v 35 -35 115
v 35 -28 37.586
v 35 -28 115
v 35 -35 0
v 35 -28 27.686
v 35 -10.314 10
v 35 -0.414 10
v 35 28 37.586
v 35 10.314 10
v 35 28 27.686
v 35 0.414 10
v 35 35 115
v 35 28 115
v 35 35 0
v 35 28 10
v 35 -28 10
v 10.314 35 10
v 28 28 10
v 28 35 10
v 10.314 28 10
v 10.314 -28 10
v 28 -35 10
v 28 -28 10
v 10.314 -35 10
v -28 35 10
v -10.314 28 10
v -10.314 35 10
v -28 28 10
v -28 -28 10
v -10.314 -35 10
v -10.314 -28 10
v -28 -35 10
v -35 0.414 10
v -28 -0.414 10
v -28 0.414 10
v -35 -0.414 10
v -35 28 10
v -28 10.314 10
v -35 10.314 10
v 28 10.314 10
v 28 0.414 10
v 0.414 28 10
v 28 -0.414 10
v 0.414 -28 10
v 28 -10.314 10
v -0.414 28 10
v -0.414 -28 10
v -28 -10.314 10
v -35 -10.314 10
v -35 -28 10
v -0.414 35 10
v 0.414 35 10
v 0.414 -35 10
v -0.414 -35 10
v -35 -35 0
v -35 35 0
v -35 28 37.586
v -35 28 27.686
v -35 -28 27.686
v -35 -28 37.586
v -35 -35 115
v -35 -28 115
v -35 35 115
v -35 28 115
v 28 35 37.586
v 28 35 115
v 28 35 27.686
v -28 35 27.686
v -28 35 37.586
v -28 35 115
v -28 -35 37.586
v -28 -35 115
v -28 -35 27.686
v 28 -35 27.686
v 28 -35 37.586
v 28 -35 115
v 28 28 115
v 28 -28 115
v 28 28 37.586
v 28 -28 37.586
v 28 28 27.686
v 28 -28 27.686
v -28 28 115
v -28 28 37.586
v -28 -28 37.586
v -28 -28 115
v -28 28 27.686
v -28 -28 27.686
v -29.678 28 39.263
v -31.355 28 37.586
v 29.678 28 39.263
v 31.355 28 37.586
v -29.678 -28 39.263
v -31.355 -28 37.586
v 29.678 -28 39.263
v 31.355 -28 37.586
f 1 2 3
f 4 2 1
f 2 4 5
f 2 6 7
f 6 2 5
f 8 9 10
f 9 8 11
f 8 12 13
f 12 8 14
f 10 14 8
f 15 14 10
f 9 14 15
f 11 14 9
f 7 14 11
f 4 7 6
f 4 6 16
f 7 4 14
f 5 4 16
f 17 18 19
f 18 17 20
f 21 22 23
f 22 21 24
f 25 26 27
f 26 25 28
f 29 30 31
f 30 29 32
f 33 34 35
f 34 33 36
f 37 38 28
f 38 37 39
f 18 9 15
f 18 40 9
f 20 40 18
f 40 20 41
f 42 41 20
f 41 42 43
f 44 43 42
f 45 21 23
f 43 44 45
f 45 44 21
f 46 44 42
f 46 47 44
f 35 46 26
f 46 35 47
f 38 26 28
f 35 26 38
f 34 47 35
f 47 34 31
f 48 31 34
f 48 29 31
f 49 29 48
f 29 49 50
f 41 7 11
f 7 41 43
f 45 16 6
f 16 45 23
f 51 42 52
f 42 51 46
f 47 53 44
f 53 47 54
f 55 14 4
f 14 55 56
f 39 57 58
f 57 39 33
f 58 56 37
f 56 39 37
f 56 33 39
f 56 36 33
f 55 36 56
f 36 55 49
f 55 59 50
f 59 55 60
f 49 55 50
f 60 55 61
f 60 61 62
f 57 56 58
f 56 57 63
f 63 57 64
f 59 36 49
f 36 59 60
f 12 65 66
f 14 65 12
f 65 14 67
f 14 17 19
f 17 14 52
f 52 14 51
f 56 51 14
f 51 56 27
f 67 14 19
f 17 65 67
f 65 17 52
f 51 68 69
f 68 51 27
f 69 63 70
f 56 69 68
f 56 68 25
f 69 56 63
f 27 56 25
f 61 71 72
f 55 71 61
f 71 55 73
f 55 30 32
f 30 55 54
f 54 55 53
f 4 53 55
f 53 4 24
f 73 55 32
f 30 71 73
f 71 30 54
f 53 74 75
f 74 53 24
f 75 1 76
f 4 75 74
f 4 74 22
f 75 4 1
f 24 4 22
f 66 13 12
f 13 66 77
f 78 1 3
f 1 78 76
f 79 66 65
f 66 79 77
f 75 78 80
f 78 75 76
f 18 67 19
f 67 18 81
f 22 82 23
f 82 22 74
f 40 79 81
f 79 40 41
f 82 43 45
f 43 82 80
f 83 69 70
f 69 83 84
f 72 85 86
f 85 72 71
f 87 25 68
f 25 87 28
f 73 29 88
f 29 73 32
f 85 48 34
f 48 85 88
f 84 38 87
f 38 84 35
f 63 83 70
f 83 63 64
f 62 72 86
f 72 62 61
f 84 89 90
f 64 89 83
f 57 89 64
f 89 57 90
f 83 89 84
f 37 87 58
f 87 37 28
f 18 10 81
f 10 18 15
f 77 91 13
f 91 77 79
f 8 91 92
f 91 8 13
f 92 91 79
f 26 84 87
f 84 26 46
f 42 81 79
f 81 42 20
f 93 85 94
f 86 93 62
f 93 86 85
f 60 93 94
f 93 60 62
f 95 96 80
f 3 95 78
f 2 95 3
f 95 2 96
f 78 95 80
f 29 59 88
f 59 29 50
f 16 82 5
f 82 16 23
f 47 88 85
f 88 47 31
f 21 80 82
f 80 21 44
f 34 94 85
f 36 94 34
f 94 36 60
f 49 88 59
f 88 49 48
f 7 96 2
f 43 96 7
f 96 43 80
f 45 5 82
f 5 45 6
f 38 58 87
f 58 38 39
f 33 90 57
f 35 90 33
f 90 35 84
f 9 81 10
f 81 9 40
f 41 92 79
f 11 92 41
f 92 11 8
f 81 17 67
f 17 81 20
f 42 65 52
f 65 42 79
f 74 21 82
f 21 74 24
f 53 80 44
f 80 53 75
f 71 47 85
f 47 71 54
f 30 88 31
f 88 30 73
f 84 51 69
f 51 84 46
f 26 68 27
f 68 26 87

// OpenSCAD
base_width = 70.0;
base_height = 10.0;

leg_height = 115.0;
leg_width = 7.0;
leg_placement = base_width / 2 - leg_width / 2;

support_length = sqrt(pow(base_width, 2) / 2.5);

// base shape
difference () {
    union () {
        // base
        translate([0, 0, base_height / 2]) {
            cube([base_width, base_width, base_height], true);
        }
        
        // legs
        translate([leg_placement, 0.0, leg_height / 2.0]) 
            { cube([leg_width, base_width, leg_height], true); };
        translate([-leg_placement, 0.0, leg_height / 2.0]) 
            { cube([leg_width, base_width, leg_height], true); };
    };

    translate([0, 0, (leg_height / 2) + base_height]) 
        { cube([base_width + leg_width + 1, base_width - 2 * leg_width, leg_height], true); };
};

// supports
translate([-leg_placement, -base_width / 4 + 1, support_length / 2 - 1]) {
    rotate(45, [1, 0, 0]) {
        cube([leg_width, leg_width, support_length], true);
    };
};
translate([leg_placement, -base_width / 4 + 1, support_length / 2 - 1]) {
    rotate(45, [1, 0, 0]) {
        cube([leg_width, leg_width, support_length], true);
    };
};

translate([-leg_placement, base_width / 4 - 1, support_length / 2 - 1]) {
    rotate(-45, [1, 0, 0]) {
        cube([leg_width, leg_width, support_length], true);
    };
};
translate([leg_placement, base_width / 4 - 1, support_length / 2 - 1]) {
    rotate(-45, [1, 0, 0]) {
        cube([leg_width, leg_width, support_length], true);
    };
};

translate([base_width / 4 - 1, leg_placement, support_length / 2 - 1]) {
    rotate(45, [0, 1, 0]) {
        cube([leg_width, leg_width, support_length], true);
    };
};
translate([base_width / 4 - 1, -leg_placement, support_length / 2 - 1]) {
    rotate(45, [0, 1, 0]) {
        cube([leg_width, leg_width, support_length], true);
    };
};

#translate([-base_width / 4 + 1, -leg_placement, support_length / 2 - 1]) {
    rotate(-45, [0, 1, 0]) {
        cube([leg_width, leg_width, support_length], true);
    };
};
#translate([-base_width / 4 + 1, leg_placement, support_length / 2 - 1]) {
    rotate(-45, [0, 1, 0]) {
        cube([leg_width, leg_width, support_length], true);
    };
};
